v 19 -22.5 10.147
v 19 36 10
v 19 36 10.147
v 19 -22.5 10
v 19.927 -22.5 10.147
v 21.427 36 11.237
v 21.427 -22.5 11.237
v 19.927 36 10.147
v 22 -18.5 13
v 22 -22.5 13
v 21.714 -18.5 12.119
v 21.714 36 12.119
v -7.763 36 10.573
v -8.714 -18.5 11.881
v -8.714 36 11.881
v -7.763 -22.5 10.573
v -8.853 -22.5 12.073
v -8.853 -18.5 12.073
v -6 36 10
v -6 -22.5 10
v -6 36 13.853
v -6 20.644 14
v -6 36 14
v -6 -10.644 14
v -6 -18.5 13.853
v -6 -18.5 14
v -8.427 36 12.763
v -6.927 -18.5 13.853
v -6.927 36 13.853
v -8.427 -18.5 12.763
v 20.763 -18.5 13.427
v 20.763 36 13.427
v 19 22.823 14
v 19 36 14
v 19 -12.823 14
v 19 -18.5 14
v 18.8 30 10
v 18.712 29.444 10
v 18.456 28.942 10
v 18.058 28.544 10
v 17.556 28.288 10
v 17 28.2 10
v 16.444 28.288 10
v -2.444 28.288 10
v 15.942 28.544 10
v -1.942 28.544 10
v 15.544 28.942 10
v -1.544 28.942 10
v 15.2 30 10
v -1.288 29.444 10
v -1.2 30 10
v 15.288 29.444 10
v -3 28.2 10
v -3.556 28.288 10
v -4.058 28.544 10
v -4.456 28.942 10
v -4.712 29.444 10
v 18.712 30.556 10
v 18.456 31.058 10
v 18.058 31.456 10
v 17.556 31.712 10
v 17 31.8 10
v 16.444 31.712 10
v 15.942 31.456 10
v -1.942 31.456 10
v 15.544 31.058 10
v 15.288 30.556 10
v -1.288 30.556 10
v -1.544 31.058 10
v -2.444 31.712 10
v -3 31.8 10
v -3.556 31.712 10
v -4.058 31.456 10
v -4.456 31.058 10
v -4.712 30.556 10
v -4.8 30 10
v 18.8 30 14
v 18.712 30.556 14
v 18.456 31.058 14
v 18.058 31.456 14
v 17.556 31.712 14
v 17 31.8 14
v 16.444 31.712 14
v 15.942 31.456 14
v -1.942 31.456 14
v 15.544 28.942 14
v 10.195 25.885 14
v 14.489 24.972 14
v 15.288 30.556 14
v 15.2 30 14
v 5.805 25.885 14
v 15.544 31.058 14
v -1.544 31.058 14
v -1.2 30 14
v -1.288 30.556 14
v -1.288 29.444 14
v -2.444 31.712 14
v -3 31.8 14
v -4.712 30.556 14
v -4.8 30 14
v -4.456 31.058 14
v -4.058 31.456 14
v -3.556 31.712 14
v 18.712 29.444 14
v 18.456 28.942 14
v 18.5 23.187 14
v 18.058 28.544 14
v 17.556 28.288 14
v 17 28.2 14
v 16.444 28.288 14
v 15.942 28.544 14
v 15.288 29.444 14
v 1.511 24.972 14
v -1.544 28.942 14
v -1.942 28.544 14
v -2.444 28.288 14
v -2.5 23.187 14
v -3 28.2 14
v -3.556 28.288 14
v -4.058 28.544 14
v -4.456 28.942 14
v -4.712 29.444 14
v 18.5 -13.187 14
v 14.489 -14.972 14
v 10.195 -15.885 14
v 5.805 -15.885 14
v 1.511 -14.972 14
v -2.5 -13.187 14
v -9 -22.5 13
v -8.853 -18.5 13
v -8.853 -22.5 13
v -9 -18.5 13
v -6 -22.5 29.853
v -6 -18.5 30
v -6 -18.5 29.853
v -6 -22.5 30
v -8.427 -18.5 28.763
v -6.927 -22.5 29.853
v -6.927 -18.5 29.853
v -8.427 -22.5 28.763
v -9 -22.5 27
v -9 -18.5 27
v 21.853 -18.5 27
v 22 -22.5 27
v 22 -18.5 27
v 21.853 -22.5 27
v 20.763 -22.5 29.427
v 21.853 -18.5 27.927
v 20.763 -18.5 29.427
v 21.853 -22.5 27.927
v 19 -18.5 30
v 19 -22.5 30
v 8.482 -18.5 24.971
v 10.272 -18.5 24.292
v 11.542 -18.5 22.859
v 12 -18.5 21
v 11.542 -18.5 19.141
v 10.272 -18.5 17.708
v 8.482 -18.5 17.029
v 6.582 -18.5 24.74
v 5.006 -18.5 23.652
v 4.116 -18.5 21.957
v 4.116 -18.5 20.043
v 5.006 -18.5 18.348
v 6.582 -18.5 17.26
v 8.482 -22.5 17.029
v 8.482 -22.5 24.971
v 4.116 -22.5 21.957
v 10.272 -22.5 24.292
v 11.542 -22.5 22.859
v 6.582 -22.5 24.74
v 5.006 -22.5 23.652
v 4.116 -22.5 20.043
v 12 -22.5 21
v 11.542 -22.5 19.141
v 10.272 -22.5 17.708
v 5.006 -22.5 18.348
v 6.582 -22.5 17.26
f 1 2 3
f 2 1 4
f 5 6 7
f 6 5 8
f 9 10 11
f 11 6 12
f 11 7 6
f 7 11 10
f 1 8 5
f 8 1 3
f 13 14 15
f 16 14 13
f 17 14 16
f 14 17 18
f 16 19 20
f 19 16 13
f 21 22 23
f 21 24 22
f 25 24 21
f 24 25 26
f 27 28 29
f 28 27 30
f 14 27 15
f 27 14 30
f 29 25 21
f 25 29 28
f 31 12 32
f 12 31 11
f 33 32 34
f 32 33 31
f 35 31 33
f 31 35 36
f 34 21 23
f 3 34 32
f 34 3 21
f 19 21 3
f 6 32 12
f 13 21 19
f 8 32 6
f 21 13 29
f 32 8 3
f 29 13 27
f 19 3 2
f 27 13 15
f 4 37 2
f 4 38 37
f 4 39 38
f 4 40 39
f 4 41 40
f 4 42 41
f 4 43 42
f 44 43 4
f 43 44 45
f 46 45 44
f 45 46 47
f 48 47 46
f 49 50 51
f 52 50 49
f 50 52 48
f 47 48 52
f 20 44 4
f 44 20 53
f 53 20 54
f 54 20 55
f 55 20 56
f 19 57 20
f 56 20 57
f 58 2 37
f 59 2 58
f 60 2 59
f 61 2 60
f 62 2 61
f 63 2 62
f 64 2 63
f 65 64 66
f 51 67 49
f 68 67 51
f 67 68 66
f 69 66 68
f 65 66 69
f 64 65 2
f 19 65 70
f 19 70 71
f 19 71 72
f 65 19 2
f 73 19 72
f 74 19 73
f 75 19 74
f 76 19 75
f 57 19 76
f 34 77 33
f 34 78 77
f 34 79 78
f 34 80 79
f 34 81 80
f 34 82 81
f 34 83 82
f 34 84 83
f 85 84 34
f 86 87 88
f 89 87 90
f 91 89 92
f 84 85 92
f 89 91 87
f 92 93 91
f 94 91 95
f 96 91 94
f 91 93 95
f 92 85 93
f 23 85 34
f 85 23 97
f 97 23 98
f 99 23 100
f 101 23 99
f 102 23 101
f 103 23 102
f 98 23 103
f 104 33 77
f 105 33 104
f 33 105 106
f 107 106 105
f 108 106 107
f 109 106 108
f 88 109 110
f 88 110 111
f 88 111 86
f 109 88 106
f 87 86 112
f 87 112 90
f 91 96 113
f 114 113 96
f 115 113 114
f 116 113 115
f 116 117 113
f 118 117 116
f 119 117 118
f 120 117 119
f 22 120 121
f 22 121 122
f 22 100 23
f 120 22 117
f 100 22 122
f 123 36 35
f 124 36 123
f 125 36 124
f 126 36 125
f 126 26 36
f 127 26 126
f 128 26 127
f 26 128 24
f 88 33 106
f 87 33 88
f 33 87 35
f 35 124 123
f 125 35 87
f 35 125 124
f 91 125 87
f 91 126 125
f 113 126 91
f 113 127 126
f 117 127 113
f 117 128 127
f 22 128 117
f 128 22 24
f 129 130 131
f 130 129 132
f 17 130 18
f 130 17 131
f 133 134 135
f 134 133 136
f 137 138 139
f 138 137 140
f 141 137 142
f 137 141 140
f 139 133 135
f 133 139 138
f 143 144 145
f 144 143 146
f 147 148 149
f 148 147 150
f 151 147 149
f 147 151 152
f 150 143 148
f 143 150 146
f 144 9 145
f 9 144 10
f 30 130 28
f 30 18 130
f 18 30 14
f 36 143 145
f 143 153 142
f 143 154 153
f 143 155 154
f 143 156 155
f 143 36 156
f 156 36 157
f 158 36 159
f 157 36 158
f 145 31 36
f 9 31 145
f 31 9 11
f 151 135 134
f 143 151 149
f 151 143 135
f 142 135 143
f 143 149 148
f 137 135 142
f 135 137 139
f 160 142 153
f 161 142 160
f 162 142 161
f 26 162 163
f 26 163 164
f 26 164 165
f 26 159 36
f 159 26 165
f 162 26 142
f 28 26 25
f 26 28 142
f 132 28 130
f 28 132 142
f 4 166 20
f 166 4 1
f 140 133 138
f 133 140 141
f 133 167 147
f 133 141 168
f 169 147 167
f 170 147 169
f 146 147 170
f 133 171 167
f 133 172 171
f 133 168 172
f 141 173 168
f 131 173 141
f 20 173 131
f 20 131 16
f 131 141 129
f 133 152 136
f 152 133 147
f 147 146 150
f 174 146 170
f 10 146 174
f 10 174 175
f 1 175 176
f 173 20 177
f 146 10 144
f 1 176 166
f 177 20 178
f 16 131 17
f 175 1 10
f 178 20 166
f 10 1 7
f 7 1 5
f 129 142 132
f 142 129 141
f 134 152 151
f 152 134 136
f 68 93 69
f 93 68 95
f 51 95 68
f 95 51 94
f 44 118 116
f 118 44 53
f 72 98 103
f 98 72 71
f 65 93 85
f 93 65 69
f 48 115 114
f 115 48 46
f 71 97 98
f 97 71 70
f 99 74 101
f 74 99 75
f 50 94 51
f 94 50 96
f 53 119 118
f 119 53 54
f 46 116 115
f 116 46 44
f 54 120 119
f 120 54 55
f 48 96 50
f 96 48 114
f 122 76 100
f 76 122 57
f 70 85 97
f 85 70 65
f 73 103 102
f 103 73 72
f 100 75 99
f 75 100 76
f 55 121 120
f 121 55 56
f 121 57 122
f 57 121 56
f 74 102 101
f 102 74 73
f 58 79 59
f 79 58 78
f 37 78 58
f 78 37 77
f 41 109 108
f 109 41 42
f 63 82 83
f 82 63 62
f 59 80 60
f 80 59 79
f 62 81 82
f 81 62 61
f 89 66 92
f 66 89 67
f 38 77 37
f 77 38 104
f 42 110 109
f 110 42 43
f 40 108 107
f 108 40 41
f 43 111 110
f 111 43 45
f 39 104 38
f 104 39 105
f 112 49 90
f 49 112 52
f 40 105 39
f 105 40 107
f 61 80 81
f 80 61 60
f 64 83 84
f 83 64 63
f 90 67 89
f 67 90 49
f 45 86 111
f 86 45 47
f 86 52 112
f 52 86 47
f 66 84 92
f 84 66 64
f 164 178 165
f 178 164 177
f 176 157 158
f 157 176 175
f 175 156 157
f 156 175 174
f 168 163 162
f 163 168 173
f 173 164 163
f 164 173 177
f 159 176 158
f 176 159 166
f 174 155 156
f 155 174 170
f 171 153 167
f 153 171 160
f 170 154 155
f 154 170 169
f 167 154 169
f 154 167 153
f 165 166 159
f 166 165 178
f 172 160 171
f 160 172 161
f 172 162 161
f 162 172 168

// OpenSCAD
// file: inc/functions.scad
// PRUSA iteration3
// Functions used in many files
// GNU GPL v3
// Josef Průša <josefprusa@me.com>
// Václav 'ax' Hůla <axtheb@gmail.com>
// Vlnofka <>
// http://www.reprap.org/wiki/Prusa_Mendel
// http://github.com/prusajr/PrusaMendel

module roundcorner(diameter){
	difference(){
		cube(size = [diameter,diameter,99], center = false);
		translate(v = [diameter, diameter, 0]) cylinder(h = 100, r=diameter, center=true);
	}
}
module nut(d,h,horizontal=true){
    cornerdiameter =  (d / 2) / cos (180 / 6);
    cylinder(h = h, r = cornerdiameter, $fn = 6);
    if(horizontal){
        for(i = [1:6]){
            rotate([0,0,60*i]) translate([-cornerdiameter-0.2,0,0]) rotate([0,0,-45]) cube([2,2,h]);
        }
    }
}

// Based on nophead research
module polyhole(d, h, center=false) {
    n = max(round(2 * d),3);
    rotate([0,0,180])
        cylinder(h = h, r = (d / 2) / cos (180 / n), $fn = n);
}

// make it interchangeable between this and cylinder
module cylinder_poly(r, h, center=false){
    polyhole(d=r*2, h=h, center=center);
}

module fillet(radius, height=100, $fn=0) {
    //this creates acutal fillet
    translate([-radius, -radius, -height/2-0.01])
        difference() {
            cube([radius*2, radius*2, height+0.02]);
            cylinder(r=radius, h=height+0.02, $fn=$fn);
        }
}

module cube_fillet(size, radius=-1, vertical=[3,3,3,3], top=[0,0,0,0], bottom=[0,0,0,0], center=false, $fn=0){
    //
    if (center) {
        cube_fillet_inside(size, radius, vertical, top, bottom, $fn);
    } else {
        translate([size[0]/2, size[1]/2, size[2]/2])
            cube_fillet_inside(size, radius, vertical, top, bottom, $fn);
    }
}

module cube_negative_fillet(size, radius=-1, vertical=[3,3,3,3], top=[0,0,0,0], bottom=[0,0,0,0], $fn=0){

    j=[1,0,1,0];

    for (i=[0:3]) {
        if (radius > -1) {
            rotate([0, 0, 90*i]) translate([size[1-j[i]]/2, size[j[i]]/2, 0]) fillet(radius, size[2], $fn=$fn);
        } else {
            rotate([0, 0, 90*i]) translate([size[1-j[i]]/2, size[j[i]]/2, 0]) fillet(vertical[i], size[2], $fn=$fn);
        }
        rotate([90*i, -90, 0]) translate([size[2]/2, size[j[i]]/2, 0 ]) fillet(top[i], size[1-j[i]], $fn=$fn);
        rotate([90*(4-i), 90, 0]) translate([size[2]/2, size[j[i]]/2, 0]) fillet(bottom[i], size[1-j[i]], $fn=$fn);

    }
}

module cube_fillet_inside(size, radius=-1, vertical=[3,3,3,3], top=[0,0,0,0], bottom=[0,0,0,0], $fn=0){
    //makes CENTERED cube with round corners
    // if you give it radius, it will fillet vertical corners.
    //othervise use vertical, top, bottom arrays
    //when viewed from top, it starts in upper right corner (+x,+y quadrant) , goes counterclockwise
    //top/bottom fillet starts in direction of Y axis and goes CCW too


    if (radius == 0) {
        cube(size, center=true);
    } else {
        difference() {
            cube(size, center=true);
            cube_negative_fillet(size, radius, vertical, top, bottom, $fn);
        }
    }
}


module nema17(places=[1,1,1,1], size=15.5, h=10, holes=false, shadow=false, $fn=24){
    for (i=[0:3]) {
        if (places[i] == 1) {
            rotate([0, 0, 90*i]) translate([size, size, 0]) {
                if (holes) {
                    #rotate([0, 0, -90*i])  translate([0,0,-10]) screw(r=1.7, slant=false, head_drop=13, $fn=$fn, h=h+12);
                } else {
                    rotate([0, 0, -90*i]) cylinder(h=h, r=5.5, $fn=$fn);
                }
            }
        }
    }
    if (shadow != false) {
        %translate ([0, 0, shadow+21+3]) cube([42,42,42], center = true);
    //flange
        %translate ([0, 0, shadow+21+3-21-1]) cylinder(r=11,h=2, center = true, $fn=20);
    //shaft
        %translate ([0, 0, shadow+21+3-21-7]) cylinder(r=2.5,h=14, center = true);
    }
}

module screw(h=20, r=2, r_head=3.5, head_drop=0, slant=true, poly=false, $fn=0){
    //makes screw with head
    //for substraction as screw hole
    if (poly) {
        cylinder_poly(h=h, r=r, $fn=$fn);
    } else {
        cylinder(h=h, r=r, $fn=$fn);
    }
    if (slant) {
        translate([0, 0, head_drop-0.01]) cylinder(h=r_head, r2=0, r1=r_head, $fn=$fn);
    }

    if (head_drop > 0) {
        translate([0, 0, -0.01]) cylinder(h=head_drop+0.01, r=r_head, $fn=$fn);
    }
}
module screw_cylinder(r_head=5.25,r=3.25,head_drop=6.2,slant=false){
	screw(r_head=r_head,head_drop=head_drop,r=r, slant=slant);

}

//screw_cylinder();
//cube_fillet([10,20,30], vertical=[3,2,0,0], top=[3,2,0,5], bottom=[3,2,0,5]);
//cube_fillet([10,20,30], radius=2, top=[7,2,7,2]);
// file: inc/metric.scad
// PRUSA iteration3
// Default metric sizes
// GNU GPL v3
// Josef Průša <josefprusa@me.com>
// http://www.reprap.org/wiki/Prusa_Mendel
// http://github.com/prusajr/PrusaMendel

// DONT CHANGE THIS FILE! ALTER VALUES IN CONFIGURATION.SCAD INSTEAD

// RODS

threaded_rod_diameter = 8.7;
threaded_rod_diameter_horizontal = 8.7;
smooth_bar_diameter = 8;
smooth_bar_diameter_horizontal = 8.8;

// Nuts and bolts

m8_diameter = 9;
m8_nut_diameter = 14.1;

m4_diameter = 4.5;
m4_nut_diameter = 9;

m3_diameter = 3.6;
m3_nut_diameter = 5.3;
m3_nut_diameter_horizontal = 6.1;

// Bushing holder

bushing_core_diameter = smooth_bar_diameter;
bushing_material_thickness = 1;

// Motors

motor_shaft = 5.5;
// file: configuration.scad
// PRUSA iteration3
// Configuration file
// GNU GPL v3
// Josef Průša <josefprusa@me.com>
// Václav 'ax' Hůla <axtheb@gmail.com>
// http://www.reprap.org/wiki/Prusa_Mendel
// http://github.com/prusajr/PrusaMendel

// PLEASE SELECT ONE OF THE CONFIGURATIONS BELOW
// BY UN-COMMENTING IT

// Uncomment for metric settings
// METRIC METRIC METRIC METRIC METRIC METRIC METRIC METRIC 

include <inc/metric.scad>;

// Custom settings here, tailor to your supplies and print settings

// Select your belt type ******************************************************

//T2.5
//belt_tooth_distance = 2.5;
//belt_tooth_ratio = 0.5;

//T5 (strongly discouraged)
belt_tooth_distance = 5;
belt_tooth_ratio = 0.75;

//HTD3
//belt_tooth_distance = 3;
//belt_tooth_ratio = 0.75;

//MXL
//belt_tooth_distance = 2.032;
//belt_tooth_ratio = 0.64;

// Choose bearing/bushing configuration ***************************************

//Choose from:

// 0 = Z as lm[e]8uu, X and Y bushings
// 1 = all bushings
// 2 = all bearings [default. Do not change unless you really know what you are doing]
// DO NOT OFFER 0 or 1 VARIANTS FOR SALE. We really mean that. In the long run it hurts everyone.

bearing_choice = 2;

// Bushing version
// 0 = square igus housings. By igus we mean JFM-0810-10 or GFM-0810-10
// 1 = round igus (works better if printed precisely)
// 2 = bronze self-aligning bushings
bushing_type = 0;

//Bearing version
// 0 = default lm8uu
// 1 = lme8uu
bearing_type = 0;

// Select idler bearing size **************************************************

// 0 = 608 [standard skate bearings]
// 1 = 624 [roughly same diameter as pulley, makes belt parallel so its prettier]

idler_bearing = 0;

// Thickness of the XZ plate board
board_thickness = 12;

//Layer height * width over thickness. Used for idler sleeve
single_wall_width = 0.3*2.2;

// END of custom settings


// You are not supposed to change this
board_to_xz_distance = 26;
xaxis_rod_distance = 45;
carriage_l = 74;
carriage_hole_to_side = 5;
carriage_hole_height = 4;

//calculated from settings

idler_size = (idler_bearing == 0) ? 22 : 13;

//use 4.5 for 608, 2.5 for 624
idler_size_inner_r = (idler_bearing == 0) ? 4.5 : 2.5;

idler_width = (idler_bearing == 0) ? 9 : 5;

// CHANGE ONLY THE STUFF YOU KNOW
// IT WILL REPLACE DEFAULT SETTING

// RODS

// threaded_rod_diameter = 0;
// threaded_rod_diameter_horizontal = 0;
// smooth_bar_diameter = 0;
// smooth_bar_diameter_horizontal = 0;

// Nuts and bolts

// m8_diameter = 0;
// m8_nut_diameter = 0;

// m4_diameter = 0;
// m4_nut_diameter = 0;

// m3_diameter = 0;
// m3_nut_diameter = 0;

// Bushing holder

// bushing_core_diameter = smooth_bar_diameter;
// bushing_material_thickness = 0;

///counted stuff
m3_nut_diameter_bigger = ((m3_nut_diameter  / 2) / cos (180 / 6))*2;

// functions
include <inc/functions.scad>


// These constants define the geometry of the complete-printer.scad

//x_smooth_rod_length=325;
//y_smooth_rod_length=405;
//z_smooth_rod_length=235;
bed_x_size=225;
bed_y_size=225;

x_smooth_rod_length=450+board_thickness*2+10; // 492 for 16mm thickness; 484 for 12mm thickness
y_smooth_rod_length=470;
z_smooth_rod_length=405;  
bed_x_size=225;
bed_y_size=225;
// main file
include <configuration.scad>

//%translate([50,0,50])rotate([0,-90,0])import("stl/x-carriage.stl",center=true);
rotate([-90,0,0])difference(){
	dial_support();
	#translate([8,-14,5])dial();

}

module dial_support(){
	difference(){
		union(){
			translate([-9,-14,-20])cube_fillet([31,4,56]);
			translate([-9,-30,-22.5])cube_fillet([31,20,4]);
		}
		translate([-3,0,30])rotate([90,0,0])cylinder(r=m3_diameter/2,h=50,$fn=20);
		translate([17,0,30])rotate([90,0,0])cylinder(r=m3_diameter/2,h=50,$fn=20);
	}
}

module dial(){
	rotate([90,0,0])cylinder(r=21,h=21);
	translate([0,-7,-34])cylinder(r=4,h=61);
}
